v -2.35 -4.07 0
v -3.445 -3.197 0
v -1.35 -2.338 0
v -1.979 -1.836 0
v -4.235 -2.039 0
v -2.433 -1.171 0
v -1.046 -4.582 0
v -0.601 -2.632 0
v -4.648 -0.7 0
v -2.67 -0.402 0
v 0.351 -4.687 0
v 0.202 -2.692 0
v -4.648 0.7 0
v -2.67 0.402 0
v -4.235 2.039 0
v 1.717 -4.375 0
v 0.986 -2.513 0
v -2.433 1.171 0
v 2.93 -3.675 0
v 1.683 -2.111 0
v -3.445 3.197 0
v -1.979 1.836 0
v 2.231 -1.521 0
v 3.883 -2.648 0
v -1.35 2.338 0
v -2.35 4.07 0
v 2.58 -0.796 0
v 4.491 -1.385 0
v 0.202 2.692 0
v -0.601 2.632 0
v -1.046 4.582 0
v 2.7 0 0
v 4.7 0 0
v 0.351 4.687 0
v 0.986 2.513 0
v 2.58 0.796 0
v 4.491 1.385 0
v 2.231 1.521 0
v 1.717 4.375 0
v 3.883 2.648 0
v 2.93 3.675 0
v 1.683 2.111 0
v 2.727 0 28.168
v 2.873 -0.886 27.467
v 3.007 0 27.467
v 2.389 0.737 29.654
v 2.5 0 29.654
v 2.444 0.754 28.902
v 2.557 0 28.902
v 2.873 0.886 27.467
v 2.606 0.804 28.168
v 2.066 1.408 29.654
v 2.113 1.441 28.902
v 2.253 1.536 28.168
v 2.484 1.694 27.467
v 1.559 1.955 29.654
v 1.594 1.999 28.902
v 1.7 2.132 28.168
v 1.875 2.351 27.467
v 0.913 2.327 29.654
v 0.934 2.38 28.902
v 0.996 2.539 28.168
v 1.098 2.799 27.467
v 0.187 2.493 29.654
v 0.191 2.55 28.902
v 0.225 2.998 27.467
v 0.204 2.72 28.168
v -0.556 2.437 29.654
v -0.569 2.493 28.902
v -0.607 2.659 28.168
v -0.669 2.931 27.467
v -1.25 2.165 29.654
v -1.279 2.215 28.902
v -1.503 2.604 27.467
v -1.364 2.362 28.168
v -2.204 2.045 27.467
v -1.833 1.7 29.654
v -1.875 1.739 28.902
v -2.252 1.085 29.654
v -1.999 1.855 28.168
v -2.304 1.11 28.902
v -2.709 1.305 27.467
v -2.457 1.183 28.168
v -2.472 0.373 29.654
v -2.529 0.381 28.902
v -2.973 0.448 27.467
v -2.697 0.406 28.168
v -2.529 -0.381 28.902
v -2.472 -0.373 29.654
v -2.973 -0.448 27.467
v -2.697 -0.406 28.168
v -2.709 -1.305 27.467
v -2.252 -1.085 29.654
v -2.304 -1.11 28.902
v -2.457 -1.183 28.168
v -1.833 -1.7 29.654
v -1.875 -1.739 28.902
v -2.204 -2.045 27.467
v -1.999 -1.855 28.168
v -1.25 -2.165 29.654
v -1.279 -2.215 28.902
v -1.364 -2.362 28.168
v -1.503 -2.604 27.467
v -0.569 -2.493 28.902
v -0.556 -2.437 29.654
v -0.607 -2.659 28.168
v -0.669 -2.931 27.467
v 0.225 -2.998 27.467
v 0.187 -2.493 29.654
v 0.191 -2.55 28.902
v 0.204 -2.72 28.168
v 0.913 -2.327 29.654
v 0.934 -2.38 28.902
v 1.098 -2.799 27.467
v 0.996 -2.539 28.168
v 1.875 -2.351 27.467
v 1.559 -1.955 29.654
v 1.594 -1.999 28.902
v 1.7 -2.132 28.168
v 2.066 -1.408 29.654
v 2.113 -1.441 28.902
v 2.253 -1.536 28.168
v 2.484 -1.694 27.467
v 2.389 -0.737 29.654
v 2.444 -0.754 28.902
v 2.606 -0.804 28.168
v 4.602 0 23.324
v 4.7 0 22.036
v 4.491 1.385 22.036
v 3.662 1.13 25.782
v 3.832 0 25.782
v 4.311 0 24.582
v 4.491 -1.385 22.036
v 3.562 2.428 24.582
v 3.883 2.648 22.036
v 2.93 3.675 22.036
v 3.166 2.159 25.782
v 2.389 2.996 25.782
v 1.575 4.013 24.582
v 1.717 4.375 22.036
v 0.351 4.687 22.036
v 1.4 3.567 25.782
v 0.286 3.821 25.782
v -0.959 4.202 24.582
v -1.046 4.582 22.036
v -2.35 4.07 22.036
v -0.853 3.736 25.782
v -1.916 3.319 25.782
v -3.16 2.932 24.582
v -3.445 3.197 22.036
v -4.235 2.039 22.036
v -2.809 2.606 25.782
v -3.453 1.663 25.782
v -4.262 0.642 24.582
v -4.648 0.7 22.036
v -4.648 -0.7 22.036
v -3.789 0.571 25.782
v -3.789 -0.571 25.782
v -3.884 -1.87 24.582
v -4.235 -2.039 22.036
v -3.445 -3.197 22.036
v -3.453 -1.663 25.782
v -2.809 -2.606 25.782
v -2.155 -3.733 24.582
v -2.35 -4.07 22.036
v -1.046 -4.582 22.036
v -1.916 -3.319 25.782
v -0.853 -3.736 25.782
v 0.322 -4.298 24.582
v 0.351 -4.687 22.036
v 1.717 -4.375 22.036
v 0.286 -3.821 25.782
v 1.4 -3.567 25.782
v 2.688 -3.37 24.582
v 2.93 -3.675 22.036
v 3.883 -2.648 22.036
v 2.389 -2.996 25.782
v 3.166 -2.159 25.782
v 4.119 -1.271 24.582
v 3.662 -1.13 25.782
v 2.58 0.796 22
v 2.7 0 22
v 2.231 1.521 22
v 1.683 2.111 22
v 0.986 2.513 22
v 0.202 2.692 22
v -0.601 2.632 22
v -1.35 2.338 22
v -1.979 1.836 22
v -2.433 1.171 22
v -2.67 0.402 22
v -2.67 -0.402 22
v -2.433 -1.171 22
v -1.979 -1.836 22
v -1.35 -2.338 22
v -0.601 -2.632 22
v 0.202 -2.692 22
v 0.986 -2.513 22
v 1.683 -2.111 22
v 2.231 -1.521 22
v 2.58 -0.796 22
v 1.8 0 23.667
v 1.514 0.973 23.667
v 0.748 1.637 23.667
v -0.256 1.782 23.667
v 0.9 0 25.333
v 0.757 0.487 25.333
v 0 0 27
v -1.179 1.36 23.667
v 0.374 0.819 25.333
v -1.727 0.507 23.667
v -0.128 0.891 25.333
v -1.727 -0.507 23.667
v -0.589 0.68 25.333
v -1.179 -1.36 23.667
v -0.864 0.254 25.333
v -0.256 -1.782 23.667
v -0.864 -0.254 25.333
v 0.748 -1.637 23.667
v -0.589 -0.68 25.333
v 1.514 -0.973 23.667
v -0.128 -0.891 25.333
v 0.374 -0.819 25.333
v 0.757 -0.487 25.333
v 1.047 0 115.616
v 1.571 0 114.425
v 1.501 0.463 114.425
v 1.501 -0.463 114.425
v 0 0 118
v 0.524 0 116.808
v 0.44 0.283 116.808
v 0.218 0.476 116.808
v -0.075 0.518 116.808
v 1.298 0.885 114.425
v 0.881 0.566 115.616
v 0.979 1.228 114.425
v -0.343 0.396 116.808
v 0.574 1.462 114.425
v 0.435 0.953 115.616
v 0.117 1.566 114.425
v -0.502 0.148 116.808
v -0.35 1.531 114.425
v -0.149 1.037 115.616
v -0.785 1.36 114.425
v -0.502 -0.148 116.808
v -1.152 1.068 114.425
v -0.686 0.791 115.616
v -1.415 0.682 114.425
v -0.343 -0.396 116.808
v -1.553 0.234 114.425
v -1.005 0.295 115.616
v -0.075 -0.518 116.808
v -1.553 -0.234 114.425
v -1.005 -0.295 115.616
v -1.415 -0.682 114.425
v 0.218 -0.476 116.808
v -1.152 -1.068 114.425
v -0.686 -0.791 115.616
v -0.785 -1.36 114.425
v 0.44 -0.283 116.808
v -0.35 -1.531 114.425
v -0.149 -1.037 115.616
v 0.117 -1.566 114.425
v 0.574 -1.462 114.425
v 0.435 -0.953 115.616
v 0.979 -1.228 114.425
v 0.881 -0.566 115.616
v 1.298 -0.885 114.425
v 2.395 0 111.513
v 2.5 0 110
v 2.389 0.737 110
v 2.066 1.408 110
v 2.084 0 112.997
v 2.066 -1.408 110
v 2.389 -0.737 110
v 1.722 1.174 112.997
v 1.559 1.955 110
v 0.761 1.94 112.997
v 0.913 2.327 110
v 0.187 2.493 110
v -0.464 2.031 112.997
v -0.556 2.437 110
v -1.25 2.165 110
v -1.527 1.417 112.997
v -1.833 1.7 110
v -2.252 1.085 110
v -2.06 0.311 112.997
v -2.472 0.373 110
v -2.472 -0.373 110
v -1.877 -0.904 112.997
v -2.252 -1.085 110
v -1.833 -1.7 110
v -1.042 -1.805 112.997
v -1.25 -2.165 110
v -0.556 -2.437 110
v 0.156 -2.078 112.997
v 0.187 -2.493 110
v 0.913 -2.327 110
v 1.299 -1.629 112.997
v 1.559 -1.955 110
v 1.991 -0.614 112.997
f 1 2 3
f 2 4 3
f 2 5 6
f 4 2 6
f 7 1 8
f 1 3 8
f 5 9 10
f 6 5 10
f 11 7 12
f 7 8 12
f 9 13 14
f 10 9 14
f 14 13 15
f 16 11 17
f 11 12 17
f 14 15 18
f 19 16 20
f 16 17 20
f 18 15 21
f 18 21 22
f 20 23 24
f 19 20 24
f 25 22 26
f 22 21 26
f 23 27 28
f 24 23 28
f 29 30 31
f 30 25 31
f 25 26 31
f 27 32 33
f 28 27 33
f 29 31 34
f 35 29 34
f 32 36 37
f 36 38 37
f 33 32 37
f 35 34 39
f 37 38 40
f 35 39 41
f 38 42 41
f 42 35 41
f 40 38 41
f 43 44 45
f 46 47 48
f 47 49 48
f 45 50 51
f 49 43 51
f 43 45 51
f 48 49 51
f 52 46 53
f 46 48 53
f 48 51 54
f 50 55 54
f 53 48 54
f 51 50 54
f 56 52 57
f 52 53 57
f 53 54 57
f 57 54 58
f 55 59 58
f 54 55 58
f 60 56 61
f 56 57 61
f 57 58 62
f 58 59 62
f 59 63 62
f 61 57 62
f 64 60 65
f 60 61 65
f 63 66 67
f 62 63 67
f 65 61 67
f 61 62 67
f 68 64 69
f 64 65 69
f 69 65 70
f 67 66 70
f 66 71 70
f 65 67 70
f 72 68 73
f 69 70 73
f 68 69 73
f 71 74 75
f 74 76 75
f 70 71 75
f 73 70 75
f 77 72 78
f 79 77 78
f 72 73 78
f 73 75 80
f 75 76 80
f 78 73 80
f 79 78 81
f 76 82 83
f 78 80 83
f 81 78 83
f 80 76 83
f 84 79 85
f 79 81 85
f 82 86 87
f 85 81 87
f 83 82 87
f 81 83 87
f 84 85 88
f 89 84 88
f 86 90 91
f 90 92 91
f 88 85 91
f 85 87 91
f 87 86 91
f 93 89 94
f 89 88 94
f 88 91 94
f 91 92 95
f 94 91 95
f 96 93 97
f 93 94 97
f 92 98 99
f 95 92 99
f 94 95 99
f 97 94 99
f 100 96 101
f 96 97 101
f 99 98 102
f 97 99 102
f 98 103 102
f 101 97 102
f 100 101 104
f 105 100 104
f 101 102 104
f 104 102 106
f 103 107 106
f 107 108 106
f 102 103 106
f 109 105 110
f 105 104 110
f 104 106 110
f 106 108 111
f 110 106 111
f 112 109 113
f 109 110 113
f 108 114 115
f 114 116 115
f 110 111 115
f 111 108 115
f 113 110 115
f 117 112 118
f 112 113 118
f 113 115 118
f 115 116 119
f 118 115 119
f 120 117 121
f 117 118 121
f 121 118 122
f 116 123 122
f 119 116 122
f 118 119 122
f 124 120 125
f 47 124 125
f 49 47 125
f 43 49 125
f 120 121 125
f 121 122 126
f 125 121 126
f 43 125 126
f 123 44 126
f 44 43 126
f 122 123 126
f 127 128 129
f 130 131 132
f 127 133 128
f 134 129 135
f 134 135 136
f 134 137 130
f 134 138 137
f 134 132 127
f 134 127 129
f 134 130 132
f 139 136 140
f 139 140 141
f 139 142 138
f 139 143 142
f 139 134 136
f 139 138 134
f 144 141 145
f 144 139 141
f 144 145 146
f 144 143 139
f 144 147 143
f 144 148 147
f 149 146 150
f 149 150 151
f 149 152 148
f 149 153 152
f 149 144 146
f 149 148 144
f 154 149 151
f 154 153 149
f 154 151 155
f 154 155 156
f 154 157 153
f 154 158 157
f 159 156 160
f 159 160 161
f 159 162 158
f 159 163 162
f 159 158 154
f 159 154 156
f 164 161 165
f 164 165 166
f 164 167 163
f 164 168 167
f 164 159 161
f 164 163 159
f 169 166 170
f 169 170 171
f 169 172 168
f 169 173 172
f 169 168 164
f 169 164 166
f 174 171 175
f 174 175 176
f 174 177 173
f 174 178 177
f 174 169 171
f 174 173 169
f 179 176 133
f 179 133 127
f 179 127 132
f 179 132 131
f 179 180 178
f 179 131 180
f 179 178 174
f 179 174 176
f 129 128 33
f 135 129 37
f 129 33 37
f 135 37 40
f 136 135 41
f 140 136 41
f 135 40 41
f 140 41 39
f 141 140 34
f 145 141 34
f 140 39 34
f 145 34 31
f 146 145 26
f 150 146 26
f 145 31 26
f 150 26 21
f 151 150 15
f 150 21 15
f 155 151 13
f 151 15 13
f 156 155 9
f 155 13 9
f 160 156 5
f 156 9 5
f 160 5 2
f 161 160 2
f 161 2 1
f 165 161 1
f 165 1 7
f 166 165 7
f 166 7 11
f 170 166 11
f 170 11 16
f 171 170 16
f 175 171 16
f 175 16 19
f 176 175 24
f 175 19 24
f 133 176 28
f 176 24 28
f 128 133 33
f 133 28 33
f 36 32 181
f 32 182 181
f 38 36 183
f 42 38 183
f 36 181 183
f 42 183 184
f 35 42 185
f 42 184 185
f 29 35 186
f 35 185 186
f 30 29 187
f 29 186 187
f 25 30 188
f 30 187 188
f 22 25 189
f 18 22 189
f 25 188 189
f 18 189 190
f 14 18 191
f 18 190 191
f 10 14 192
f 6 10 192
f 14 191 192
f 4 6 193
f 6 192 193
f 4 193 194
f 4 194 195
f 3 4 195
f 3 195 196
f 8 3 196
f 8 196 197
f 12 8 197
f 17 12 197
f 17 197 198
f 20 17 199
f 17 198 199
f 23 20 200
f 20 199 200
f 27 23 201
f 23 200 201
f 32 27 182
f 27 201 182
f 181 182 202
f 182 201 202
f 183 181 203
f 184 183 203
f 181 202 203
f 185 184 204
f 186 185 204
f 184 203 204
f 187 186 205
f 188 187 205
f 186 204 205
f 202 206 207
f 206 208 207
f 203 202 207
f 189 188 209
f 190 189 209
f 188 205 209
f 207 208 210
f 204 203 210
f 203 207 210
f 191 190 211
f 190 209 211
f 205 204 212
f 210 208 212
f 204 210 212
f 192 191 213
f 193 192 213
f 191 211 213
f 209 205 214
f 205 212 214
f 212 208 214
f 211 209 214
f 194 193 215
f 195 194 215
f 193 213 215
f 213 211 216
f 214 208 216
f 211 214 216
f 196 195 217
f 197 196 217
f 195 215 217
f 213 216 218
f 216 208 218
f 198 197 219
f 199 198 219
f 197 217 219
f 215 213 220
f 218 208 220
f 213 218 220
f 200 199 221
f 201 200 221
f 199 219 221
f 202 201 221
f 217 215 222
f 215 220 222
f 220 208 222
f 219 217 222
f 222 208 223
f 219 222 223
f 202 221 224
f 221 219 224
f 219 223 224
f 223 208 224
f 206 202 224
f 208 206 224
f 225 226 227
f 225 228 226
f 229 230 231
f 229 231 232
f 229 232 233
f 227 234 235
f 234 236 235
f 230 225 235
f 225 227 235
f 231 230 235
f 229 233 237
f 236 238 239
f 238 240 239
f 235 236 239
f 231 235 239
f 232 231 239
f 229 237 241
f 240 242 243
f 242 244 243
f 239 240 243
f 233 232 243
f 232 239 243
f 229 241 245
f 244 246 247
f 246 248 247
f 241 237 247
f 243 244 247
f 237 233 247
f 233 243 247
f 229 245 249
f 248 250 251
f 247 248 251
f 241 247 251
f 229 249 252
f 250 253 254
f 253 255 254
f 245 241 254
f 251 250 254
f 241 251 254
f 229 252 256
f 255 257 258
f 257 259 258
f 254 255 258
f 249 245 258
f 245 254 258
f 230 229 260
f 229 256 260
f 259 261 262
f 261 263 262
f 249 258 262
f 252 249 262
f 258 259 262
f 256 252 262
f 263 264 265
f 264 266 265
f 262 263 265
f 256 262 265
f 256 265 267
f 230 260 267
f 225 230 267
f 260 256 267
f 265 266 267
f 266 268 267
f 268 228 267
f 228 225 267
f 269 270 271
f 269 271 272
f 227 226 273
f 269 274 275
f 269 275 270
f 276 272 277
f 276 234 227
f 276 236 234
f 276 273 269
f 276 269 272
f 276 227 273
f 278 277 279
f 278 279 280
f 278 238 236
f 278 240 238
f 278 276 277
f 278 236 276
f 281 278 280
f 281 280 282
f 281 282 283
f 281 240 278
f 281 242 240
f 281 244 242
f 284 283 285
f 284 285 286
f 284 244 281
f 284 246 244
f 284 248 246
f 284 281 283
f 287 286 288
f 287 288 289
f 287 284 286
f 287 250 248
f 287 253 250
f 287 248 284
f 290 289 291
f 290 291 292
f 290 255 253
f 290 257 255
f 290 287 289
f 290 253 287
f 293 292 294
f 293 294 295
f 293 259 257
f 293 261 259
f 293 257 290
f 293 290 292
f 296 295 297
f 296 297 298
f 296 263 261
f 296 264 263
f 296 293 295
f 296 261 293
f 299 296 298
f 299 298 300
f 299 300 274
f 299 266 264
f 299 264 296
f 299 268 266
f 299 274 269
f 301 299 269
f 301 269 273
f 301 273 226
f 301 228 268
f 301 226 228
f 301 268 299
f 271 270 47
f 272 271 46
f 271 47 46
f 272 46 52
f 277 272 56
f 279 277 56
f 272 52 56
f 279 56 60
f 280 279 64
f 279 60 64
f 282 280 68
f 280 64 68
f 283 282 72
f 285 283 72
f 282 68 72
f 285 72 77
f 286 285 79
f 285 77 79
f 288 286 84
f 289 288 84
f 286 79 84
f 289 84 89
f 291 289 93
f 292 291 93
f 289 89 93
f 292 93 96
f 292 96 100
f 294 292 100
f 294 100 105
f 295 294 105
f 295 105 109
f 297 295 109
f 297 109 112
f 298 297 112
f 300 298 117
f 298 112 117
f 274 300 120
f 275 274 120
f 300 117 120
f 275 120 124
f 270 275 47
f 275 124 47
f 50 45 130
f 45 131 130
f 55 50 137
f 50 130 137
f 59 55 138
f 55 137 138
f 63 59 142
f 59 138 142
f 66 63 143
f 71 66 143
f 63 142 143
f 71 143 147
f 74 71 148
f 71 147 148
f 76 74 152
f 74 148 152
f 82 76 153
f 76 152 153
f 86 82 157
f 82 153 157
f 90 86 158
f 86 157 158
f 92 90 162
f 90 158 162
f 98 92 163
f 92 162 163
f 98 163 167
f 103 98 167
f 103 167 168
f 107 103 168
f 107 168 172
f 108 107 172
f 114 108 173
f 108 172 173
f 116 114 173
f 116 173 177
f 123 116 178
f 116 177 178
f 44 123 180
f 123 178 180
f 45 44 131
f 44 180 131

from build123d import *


with BuildPart() as part:
    # Sketch → Revolution (revolve)
    with BuildSketch(Plane.XZ):
        with BuildLine():
            Line((2.7, 0), (2.7, 22))
            Line((2.7, 22), (0, 27))
            Line((0, 27), (0, 118))
            Line((0, 118), (1.570833, 114.42474))
            ThreePointArc((2.5, 110), (2.265202, 112.260624), (1.570833, 114.42474))
            Line((2.5, 110), (2.5, 29.65414))
            ThreePointArc((2.5, 29.65414), (2.62833, 28.531812), (3.006695, 27.46742))
            Line((3.006695, 27.46742), (3.832075, 25.78202))
            ThreePointArc((4.7, 22.036358), (4.480182, 23.958809), (3.832075, 25.78202))
            Line((4.7, 22.036358), (4.7, 0))
            Line((4.7, 0), (2.7, 0))
        make_face()
    revolve(axis=Axis((0, 0, 0), (0, 0, 1)))


solid = part.part
